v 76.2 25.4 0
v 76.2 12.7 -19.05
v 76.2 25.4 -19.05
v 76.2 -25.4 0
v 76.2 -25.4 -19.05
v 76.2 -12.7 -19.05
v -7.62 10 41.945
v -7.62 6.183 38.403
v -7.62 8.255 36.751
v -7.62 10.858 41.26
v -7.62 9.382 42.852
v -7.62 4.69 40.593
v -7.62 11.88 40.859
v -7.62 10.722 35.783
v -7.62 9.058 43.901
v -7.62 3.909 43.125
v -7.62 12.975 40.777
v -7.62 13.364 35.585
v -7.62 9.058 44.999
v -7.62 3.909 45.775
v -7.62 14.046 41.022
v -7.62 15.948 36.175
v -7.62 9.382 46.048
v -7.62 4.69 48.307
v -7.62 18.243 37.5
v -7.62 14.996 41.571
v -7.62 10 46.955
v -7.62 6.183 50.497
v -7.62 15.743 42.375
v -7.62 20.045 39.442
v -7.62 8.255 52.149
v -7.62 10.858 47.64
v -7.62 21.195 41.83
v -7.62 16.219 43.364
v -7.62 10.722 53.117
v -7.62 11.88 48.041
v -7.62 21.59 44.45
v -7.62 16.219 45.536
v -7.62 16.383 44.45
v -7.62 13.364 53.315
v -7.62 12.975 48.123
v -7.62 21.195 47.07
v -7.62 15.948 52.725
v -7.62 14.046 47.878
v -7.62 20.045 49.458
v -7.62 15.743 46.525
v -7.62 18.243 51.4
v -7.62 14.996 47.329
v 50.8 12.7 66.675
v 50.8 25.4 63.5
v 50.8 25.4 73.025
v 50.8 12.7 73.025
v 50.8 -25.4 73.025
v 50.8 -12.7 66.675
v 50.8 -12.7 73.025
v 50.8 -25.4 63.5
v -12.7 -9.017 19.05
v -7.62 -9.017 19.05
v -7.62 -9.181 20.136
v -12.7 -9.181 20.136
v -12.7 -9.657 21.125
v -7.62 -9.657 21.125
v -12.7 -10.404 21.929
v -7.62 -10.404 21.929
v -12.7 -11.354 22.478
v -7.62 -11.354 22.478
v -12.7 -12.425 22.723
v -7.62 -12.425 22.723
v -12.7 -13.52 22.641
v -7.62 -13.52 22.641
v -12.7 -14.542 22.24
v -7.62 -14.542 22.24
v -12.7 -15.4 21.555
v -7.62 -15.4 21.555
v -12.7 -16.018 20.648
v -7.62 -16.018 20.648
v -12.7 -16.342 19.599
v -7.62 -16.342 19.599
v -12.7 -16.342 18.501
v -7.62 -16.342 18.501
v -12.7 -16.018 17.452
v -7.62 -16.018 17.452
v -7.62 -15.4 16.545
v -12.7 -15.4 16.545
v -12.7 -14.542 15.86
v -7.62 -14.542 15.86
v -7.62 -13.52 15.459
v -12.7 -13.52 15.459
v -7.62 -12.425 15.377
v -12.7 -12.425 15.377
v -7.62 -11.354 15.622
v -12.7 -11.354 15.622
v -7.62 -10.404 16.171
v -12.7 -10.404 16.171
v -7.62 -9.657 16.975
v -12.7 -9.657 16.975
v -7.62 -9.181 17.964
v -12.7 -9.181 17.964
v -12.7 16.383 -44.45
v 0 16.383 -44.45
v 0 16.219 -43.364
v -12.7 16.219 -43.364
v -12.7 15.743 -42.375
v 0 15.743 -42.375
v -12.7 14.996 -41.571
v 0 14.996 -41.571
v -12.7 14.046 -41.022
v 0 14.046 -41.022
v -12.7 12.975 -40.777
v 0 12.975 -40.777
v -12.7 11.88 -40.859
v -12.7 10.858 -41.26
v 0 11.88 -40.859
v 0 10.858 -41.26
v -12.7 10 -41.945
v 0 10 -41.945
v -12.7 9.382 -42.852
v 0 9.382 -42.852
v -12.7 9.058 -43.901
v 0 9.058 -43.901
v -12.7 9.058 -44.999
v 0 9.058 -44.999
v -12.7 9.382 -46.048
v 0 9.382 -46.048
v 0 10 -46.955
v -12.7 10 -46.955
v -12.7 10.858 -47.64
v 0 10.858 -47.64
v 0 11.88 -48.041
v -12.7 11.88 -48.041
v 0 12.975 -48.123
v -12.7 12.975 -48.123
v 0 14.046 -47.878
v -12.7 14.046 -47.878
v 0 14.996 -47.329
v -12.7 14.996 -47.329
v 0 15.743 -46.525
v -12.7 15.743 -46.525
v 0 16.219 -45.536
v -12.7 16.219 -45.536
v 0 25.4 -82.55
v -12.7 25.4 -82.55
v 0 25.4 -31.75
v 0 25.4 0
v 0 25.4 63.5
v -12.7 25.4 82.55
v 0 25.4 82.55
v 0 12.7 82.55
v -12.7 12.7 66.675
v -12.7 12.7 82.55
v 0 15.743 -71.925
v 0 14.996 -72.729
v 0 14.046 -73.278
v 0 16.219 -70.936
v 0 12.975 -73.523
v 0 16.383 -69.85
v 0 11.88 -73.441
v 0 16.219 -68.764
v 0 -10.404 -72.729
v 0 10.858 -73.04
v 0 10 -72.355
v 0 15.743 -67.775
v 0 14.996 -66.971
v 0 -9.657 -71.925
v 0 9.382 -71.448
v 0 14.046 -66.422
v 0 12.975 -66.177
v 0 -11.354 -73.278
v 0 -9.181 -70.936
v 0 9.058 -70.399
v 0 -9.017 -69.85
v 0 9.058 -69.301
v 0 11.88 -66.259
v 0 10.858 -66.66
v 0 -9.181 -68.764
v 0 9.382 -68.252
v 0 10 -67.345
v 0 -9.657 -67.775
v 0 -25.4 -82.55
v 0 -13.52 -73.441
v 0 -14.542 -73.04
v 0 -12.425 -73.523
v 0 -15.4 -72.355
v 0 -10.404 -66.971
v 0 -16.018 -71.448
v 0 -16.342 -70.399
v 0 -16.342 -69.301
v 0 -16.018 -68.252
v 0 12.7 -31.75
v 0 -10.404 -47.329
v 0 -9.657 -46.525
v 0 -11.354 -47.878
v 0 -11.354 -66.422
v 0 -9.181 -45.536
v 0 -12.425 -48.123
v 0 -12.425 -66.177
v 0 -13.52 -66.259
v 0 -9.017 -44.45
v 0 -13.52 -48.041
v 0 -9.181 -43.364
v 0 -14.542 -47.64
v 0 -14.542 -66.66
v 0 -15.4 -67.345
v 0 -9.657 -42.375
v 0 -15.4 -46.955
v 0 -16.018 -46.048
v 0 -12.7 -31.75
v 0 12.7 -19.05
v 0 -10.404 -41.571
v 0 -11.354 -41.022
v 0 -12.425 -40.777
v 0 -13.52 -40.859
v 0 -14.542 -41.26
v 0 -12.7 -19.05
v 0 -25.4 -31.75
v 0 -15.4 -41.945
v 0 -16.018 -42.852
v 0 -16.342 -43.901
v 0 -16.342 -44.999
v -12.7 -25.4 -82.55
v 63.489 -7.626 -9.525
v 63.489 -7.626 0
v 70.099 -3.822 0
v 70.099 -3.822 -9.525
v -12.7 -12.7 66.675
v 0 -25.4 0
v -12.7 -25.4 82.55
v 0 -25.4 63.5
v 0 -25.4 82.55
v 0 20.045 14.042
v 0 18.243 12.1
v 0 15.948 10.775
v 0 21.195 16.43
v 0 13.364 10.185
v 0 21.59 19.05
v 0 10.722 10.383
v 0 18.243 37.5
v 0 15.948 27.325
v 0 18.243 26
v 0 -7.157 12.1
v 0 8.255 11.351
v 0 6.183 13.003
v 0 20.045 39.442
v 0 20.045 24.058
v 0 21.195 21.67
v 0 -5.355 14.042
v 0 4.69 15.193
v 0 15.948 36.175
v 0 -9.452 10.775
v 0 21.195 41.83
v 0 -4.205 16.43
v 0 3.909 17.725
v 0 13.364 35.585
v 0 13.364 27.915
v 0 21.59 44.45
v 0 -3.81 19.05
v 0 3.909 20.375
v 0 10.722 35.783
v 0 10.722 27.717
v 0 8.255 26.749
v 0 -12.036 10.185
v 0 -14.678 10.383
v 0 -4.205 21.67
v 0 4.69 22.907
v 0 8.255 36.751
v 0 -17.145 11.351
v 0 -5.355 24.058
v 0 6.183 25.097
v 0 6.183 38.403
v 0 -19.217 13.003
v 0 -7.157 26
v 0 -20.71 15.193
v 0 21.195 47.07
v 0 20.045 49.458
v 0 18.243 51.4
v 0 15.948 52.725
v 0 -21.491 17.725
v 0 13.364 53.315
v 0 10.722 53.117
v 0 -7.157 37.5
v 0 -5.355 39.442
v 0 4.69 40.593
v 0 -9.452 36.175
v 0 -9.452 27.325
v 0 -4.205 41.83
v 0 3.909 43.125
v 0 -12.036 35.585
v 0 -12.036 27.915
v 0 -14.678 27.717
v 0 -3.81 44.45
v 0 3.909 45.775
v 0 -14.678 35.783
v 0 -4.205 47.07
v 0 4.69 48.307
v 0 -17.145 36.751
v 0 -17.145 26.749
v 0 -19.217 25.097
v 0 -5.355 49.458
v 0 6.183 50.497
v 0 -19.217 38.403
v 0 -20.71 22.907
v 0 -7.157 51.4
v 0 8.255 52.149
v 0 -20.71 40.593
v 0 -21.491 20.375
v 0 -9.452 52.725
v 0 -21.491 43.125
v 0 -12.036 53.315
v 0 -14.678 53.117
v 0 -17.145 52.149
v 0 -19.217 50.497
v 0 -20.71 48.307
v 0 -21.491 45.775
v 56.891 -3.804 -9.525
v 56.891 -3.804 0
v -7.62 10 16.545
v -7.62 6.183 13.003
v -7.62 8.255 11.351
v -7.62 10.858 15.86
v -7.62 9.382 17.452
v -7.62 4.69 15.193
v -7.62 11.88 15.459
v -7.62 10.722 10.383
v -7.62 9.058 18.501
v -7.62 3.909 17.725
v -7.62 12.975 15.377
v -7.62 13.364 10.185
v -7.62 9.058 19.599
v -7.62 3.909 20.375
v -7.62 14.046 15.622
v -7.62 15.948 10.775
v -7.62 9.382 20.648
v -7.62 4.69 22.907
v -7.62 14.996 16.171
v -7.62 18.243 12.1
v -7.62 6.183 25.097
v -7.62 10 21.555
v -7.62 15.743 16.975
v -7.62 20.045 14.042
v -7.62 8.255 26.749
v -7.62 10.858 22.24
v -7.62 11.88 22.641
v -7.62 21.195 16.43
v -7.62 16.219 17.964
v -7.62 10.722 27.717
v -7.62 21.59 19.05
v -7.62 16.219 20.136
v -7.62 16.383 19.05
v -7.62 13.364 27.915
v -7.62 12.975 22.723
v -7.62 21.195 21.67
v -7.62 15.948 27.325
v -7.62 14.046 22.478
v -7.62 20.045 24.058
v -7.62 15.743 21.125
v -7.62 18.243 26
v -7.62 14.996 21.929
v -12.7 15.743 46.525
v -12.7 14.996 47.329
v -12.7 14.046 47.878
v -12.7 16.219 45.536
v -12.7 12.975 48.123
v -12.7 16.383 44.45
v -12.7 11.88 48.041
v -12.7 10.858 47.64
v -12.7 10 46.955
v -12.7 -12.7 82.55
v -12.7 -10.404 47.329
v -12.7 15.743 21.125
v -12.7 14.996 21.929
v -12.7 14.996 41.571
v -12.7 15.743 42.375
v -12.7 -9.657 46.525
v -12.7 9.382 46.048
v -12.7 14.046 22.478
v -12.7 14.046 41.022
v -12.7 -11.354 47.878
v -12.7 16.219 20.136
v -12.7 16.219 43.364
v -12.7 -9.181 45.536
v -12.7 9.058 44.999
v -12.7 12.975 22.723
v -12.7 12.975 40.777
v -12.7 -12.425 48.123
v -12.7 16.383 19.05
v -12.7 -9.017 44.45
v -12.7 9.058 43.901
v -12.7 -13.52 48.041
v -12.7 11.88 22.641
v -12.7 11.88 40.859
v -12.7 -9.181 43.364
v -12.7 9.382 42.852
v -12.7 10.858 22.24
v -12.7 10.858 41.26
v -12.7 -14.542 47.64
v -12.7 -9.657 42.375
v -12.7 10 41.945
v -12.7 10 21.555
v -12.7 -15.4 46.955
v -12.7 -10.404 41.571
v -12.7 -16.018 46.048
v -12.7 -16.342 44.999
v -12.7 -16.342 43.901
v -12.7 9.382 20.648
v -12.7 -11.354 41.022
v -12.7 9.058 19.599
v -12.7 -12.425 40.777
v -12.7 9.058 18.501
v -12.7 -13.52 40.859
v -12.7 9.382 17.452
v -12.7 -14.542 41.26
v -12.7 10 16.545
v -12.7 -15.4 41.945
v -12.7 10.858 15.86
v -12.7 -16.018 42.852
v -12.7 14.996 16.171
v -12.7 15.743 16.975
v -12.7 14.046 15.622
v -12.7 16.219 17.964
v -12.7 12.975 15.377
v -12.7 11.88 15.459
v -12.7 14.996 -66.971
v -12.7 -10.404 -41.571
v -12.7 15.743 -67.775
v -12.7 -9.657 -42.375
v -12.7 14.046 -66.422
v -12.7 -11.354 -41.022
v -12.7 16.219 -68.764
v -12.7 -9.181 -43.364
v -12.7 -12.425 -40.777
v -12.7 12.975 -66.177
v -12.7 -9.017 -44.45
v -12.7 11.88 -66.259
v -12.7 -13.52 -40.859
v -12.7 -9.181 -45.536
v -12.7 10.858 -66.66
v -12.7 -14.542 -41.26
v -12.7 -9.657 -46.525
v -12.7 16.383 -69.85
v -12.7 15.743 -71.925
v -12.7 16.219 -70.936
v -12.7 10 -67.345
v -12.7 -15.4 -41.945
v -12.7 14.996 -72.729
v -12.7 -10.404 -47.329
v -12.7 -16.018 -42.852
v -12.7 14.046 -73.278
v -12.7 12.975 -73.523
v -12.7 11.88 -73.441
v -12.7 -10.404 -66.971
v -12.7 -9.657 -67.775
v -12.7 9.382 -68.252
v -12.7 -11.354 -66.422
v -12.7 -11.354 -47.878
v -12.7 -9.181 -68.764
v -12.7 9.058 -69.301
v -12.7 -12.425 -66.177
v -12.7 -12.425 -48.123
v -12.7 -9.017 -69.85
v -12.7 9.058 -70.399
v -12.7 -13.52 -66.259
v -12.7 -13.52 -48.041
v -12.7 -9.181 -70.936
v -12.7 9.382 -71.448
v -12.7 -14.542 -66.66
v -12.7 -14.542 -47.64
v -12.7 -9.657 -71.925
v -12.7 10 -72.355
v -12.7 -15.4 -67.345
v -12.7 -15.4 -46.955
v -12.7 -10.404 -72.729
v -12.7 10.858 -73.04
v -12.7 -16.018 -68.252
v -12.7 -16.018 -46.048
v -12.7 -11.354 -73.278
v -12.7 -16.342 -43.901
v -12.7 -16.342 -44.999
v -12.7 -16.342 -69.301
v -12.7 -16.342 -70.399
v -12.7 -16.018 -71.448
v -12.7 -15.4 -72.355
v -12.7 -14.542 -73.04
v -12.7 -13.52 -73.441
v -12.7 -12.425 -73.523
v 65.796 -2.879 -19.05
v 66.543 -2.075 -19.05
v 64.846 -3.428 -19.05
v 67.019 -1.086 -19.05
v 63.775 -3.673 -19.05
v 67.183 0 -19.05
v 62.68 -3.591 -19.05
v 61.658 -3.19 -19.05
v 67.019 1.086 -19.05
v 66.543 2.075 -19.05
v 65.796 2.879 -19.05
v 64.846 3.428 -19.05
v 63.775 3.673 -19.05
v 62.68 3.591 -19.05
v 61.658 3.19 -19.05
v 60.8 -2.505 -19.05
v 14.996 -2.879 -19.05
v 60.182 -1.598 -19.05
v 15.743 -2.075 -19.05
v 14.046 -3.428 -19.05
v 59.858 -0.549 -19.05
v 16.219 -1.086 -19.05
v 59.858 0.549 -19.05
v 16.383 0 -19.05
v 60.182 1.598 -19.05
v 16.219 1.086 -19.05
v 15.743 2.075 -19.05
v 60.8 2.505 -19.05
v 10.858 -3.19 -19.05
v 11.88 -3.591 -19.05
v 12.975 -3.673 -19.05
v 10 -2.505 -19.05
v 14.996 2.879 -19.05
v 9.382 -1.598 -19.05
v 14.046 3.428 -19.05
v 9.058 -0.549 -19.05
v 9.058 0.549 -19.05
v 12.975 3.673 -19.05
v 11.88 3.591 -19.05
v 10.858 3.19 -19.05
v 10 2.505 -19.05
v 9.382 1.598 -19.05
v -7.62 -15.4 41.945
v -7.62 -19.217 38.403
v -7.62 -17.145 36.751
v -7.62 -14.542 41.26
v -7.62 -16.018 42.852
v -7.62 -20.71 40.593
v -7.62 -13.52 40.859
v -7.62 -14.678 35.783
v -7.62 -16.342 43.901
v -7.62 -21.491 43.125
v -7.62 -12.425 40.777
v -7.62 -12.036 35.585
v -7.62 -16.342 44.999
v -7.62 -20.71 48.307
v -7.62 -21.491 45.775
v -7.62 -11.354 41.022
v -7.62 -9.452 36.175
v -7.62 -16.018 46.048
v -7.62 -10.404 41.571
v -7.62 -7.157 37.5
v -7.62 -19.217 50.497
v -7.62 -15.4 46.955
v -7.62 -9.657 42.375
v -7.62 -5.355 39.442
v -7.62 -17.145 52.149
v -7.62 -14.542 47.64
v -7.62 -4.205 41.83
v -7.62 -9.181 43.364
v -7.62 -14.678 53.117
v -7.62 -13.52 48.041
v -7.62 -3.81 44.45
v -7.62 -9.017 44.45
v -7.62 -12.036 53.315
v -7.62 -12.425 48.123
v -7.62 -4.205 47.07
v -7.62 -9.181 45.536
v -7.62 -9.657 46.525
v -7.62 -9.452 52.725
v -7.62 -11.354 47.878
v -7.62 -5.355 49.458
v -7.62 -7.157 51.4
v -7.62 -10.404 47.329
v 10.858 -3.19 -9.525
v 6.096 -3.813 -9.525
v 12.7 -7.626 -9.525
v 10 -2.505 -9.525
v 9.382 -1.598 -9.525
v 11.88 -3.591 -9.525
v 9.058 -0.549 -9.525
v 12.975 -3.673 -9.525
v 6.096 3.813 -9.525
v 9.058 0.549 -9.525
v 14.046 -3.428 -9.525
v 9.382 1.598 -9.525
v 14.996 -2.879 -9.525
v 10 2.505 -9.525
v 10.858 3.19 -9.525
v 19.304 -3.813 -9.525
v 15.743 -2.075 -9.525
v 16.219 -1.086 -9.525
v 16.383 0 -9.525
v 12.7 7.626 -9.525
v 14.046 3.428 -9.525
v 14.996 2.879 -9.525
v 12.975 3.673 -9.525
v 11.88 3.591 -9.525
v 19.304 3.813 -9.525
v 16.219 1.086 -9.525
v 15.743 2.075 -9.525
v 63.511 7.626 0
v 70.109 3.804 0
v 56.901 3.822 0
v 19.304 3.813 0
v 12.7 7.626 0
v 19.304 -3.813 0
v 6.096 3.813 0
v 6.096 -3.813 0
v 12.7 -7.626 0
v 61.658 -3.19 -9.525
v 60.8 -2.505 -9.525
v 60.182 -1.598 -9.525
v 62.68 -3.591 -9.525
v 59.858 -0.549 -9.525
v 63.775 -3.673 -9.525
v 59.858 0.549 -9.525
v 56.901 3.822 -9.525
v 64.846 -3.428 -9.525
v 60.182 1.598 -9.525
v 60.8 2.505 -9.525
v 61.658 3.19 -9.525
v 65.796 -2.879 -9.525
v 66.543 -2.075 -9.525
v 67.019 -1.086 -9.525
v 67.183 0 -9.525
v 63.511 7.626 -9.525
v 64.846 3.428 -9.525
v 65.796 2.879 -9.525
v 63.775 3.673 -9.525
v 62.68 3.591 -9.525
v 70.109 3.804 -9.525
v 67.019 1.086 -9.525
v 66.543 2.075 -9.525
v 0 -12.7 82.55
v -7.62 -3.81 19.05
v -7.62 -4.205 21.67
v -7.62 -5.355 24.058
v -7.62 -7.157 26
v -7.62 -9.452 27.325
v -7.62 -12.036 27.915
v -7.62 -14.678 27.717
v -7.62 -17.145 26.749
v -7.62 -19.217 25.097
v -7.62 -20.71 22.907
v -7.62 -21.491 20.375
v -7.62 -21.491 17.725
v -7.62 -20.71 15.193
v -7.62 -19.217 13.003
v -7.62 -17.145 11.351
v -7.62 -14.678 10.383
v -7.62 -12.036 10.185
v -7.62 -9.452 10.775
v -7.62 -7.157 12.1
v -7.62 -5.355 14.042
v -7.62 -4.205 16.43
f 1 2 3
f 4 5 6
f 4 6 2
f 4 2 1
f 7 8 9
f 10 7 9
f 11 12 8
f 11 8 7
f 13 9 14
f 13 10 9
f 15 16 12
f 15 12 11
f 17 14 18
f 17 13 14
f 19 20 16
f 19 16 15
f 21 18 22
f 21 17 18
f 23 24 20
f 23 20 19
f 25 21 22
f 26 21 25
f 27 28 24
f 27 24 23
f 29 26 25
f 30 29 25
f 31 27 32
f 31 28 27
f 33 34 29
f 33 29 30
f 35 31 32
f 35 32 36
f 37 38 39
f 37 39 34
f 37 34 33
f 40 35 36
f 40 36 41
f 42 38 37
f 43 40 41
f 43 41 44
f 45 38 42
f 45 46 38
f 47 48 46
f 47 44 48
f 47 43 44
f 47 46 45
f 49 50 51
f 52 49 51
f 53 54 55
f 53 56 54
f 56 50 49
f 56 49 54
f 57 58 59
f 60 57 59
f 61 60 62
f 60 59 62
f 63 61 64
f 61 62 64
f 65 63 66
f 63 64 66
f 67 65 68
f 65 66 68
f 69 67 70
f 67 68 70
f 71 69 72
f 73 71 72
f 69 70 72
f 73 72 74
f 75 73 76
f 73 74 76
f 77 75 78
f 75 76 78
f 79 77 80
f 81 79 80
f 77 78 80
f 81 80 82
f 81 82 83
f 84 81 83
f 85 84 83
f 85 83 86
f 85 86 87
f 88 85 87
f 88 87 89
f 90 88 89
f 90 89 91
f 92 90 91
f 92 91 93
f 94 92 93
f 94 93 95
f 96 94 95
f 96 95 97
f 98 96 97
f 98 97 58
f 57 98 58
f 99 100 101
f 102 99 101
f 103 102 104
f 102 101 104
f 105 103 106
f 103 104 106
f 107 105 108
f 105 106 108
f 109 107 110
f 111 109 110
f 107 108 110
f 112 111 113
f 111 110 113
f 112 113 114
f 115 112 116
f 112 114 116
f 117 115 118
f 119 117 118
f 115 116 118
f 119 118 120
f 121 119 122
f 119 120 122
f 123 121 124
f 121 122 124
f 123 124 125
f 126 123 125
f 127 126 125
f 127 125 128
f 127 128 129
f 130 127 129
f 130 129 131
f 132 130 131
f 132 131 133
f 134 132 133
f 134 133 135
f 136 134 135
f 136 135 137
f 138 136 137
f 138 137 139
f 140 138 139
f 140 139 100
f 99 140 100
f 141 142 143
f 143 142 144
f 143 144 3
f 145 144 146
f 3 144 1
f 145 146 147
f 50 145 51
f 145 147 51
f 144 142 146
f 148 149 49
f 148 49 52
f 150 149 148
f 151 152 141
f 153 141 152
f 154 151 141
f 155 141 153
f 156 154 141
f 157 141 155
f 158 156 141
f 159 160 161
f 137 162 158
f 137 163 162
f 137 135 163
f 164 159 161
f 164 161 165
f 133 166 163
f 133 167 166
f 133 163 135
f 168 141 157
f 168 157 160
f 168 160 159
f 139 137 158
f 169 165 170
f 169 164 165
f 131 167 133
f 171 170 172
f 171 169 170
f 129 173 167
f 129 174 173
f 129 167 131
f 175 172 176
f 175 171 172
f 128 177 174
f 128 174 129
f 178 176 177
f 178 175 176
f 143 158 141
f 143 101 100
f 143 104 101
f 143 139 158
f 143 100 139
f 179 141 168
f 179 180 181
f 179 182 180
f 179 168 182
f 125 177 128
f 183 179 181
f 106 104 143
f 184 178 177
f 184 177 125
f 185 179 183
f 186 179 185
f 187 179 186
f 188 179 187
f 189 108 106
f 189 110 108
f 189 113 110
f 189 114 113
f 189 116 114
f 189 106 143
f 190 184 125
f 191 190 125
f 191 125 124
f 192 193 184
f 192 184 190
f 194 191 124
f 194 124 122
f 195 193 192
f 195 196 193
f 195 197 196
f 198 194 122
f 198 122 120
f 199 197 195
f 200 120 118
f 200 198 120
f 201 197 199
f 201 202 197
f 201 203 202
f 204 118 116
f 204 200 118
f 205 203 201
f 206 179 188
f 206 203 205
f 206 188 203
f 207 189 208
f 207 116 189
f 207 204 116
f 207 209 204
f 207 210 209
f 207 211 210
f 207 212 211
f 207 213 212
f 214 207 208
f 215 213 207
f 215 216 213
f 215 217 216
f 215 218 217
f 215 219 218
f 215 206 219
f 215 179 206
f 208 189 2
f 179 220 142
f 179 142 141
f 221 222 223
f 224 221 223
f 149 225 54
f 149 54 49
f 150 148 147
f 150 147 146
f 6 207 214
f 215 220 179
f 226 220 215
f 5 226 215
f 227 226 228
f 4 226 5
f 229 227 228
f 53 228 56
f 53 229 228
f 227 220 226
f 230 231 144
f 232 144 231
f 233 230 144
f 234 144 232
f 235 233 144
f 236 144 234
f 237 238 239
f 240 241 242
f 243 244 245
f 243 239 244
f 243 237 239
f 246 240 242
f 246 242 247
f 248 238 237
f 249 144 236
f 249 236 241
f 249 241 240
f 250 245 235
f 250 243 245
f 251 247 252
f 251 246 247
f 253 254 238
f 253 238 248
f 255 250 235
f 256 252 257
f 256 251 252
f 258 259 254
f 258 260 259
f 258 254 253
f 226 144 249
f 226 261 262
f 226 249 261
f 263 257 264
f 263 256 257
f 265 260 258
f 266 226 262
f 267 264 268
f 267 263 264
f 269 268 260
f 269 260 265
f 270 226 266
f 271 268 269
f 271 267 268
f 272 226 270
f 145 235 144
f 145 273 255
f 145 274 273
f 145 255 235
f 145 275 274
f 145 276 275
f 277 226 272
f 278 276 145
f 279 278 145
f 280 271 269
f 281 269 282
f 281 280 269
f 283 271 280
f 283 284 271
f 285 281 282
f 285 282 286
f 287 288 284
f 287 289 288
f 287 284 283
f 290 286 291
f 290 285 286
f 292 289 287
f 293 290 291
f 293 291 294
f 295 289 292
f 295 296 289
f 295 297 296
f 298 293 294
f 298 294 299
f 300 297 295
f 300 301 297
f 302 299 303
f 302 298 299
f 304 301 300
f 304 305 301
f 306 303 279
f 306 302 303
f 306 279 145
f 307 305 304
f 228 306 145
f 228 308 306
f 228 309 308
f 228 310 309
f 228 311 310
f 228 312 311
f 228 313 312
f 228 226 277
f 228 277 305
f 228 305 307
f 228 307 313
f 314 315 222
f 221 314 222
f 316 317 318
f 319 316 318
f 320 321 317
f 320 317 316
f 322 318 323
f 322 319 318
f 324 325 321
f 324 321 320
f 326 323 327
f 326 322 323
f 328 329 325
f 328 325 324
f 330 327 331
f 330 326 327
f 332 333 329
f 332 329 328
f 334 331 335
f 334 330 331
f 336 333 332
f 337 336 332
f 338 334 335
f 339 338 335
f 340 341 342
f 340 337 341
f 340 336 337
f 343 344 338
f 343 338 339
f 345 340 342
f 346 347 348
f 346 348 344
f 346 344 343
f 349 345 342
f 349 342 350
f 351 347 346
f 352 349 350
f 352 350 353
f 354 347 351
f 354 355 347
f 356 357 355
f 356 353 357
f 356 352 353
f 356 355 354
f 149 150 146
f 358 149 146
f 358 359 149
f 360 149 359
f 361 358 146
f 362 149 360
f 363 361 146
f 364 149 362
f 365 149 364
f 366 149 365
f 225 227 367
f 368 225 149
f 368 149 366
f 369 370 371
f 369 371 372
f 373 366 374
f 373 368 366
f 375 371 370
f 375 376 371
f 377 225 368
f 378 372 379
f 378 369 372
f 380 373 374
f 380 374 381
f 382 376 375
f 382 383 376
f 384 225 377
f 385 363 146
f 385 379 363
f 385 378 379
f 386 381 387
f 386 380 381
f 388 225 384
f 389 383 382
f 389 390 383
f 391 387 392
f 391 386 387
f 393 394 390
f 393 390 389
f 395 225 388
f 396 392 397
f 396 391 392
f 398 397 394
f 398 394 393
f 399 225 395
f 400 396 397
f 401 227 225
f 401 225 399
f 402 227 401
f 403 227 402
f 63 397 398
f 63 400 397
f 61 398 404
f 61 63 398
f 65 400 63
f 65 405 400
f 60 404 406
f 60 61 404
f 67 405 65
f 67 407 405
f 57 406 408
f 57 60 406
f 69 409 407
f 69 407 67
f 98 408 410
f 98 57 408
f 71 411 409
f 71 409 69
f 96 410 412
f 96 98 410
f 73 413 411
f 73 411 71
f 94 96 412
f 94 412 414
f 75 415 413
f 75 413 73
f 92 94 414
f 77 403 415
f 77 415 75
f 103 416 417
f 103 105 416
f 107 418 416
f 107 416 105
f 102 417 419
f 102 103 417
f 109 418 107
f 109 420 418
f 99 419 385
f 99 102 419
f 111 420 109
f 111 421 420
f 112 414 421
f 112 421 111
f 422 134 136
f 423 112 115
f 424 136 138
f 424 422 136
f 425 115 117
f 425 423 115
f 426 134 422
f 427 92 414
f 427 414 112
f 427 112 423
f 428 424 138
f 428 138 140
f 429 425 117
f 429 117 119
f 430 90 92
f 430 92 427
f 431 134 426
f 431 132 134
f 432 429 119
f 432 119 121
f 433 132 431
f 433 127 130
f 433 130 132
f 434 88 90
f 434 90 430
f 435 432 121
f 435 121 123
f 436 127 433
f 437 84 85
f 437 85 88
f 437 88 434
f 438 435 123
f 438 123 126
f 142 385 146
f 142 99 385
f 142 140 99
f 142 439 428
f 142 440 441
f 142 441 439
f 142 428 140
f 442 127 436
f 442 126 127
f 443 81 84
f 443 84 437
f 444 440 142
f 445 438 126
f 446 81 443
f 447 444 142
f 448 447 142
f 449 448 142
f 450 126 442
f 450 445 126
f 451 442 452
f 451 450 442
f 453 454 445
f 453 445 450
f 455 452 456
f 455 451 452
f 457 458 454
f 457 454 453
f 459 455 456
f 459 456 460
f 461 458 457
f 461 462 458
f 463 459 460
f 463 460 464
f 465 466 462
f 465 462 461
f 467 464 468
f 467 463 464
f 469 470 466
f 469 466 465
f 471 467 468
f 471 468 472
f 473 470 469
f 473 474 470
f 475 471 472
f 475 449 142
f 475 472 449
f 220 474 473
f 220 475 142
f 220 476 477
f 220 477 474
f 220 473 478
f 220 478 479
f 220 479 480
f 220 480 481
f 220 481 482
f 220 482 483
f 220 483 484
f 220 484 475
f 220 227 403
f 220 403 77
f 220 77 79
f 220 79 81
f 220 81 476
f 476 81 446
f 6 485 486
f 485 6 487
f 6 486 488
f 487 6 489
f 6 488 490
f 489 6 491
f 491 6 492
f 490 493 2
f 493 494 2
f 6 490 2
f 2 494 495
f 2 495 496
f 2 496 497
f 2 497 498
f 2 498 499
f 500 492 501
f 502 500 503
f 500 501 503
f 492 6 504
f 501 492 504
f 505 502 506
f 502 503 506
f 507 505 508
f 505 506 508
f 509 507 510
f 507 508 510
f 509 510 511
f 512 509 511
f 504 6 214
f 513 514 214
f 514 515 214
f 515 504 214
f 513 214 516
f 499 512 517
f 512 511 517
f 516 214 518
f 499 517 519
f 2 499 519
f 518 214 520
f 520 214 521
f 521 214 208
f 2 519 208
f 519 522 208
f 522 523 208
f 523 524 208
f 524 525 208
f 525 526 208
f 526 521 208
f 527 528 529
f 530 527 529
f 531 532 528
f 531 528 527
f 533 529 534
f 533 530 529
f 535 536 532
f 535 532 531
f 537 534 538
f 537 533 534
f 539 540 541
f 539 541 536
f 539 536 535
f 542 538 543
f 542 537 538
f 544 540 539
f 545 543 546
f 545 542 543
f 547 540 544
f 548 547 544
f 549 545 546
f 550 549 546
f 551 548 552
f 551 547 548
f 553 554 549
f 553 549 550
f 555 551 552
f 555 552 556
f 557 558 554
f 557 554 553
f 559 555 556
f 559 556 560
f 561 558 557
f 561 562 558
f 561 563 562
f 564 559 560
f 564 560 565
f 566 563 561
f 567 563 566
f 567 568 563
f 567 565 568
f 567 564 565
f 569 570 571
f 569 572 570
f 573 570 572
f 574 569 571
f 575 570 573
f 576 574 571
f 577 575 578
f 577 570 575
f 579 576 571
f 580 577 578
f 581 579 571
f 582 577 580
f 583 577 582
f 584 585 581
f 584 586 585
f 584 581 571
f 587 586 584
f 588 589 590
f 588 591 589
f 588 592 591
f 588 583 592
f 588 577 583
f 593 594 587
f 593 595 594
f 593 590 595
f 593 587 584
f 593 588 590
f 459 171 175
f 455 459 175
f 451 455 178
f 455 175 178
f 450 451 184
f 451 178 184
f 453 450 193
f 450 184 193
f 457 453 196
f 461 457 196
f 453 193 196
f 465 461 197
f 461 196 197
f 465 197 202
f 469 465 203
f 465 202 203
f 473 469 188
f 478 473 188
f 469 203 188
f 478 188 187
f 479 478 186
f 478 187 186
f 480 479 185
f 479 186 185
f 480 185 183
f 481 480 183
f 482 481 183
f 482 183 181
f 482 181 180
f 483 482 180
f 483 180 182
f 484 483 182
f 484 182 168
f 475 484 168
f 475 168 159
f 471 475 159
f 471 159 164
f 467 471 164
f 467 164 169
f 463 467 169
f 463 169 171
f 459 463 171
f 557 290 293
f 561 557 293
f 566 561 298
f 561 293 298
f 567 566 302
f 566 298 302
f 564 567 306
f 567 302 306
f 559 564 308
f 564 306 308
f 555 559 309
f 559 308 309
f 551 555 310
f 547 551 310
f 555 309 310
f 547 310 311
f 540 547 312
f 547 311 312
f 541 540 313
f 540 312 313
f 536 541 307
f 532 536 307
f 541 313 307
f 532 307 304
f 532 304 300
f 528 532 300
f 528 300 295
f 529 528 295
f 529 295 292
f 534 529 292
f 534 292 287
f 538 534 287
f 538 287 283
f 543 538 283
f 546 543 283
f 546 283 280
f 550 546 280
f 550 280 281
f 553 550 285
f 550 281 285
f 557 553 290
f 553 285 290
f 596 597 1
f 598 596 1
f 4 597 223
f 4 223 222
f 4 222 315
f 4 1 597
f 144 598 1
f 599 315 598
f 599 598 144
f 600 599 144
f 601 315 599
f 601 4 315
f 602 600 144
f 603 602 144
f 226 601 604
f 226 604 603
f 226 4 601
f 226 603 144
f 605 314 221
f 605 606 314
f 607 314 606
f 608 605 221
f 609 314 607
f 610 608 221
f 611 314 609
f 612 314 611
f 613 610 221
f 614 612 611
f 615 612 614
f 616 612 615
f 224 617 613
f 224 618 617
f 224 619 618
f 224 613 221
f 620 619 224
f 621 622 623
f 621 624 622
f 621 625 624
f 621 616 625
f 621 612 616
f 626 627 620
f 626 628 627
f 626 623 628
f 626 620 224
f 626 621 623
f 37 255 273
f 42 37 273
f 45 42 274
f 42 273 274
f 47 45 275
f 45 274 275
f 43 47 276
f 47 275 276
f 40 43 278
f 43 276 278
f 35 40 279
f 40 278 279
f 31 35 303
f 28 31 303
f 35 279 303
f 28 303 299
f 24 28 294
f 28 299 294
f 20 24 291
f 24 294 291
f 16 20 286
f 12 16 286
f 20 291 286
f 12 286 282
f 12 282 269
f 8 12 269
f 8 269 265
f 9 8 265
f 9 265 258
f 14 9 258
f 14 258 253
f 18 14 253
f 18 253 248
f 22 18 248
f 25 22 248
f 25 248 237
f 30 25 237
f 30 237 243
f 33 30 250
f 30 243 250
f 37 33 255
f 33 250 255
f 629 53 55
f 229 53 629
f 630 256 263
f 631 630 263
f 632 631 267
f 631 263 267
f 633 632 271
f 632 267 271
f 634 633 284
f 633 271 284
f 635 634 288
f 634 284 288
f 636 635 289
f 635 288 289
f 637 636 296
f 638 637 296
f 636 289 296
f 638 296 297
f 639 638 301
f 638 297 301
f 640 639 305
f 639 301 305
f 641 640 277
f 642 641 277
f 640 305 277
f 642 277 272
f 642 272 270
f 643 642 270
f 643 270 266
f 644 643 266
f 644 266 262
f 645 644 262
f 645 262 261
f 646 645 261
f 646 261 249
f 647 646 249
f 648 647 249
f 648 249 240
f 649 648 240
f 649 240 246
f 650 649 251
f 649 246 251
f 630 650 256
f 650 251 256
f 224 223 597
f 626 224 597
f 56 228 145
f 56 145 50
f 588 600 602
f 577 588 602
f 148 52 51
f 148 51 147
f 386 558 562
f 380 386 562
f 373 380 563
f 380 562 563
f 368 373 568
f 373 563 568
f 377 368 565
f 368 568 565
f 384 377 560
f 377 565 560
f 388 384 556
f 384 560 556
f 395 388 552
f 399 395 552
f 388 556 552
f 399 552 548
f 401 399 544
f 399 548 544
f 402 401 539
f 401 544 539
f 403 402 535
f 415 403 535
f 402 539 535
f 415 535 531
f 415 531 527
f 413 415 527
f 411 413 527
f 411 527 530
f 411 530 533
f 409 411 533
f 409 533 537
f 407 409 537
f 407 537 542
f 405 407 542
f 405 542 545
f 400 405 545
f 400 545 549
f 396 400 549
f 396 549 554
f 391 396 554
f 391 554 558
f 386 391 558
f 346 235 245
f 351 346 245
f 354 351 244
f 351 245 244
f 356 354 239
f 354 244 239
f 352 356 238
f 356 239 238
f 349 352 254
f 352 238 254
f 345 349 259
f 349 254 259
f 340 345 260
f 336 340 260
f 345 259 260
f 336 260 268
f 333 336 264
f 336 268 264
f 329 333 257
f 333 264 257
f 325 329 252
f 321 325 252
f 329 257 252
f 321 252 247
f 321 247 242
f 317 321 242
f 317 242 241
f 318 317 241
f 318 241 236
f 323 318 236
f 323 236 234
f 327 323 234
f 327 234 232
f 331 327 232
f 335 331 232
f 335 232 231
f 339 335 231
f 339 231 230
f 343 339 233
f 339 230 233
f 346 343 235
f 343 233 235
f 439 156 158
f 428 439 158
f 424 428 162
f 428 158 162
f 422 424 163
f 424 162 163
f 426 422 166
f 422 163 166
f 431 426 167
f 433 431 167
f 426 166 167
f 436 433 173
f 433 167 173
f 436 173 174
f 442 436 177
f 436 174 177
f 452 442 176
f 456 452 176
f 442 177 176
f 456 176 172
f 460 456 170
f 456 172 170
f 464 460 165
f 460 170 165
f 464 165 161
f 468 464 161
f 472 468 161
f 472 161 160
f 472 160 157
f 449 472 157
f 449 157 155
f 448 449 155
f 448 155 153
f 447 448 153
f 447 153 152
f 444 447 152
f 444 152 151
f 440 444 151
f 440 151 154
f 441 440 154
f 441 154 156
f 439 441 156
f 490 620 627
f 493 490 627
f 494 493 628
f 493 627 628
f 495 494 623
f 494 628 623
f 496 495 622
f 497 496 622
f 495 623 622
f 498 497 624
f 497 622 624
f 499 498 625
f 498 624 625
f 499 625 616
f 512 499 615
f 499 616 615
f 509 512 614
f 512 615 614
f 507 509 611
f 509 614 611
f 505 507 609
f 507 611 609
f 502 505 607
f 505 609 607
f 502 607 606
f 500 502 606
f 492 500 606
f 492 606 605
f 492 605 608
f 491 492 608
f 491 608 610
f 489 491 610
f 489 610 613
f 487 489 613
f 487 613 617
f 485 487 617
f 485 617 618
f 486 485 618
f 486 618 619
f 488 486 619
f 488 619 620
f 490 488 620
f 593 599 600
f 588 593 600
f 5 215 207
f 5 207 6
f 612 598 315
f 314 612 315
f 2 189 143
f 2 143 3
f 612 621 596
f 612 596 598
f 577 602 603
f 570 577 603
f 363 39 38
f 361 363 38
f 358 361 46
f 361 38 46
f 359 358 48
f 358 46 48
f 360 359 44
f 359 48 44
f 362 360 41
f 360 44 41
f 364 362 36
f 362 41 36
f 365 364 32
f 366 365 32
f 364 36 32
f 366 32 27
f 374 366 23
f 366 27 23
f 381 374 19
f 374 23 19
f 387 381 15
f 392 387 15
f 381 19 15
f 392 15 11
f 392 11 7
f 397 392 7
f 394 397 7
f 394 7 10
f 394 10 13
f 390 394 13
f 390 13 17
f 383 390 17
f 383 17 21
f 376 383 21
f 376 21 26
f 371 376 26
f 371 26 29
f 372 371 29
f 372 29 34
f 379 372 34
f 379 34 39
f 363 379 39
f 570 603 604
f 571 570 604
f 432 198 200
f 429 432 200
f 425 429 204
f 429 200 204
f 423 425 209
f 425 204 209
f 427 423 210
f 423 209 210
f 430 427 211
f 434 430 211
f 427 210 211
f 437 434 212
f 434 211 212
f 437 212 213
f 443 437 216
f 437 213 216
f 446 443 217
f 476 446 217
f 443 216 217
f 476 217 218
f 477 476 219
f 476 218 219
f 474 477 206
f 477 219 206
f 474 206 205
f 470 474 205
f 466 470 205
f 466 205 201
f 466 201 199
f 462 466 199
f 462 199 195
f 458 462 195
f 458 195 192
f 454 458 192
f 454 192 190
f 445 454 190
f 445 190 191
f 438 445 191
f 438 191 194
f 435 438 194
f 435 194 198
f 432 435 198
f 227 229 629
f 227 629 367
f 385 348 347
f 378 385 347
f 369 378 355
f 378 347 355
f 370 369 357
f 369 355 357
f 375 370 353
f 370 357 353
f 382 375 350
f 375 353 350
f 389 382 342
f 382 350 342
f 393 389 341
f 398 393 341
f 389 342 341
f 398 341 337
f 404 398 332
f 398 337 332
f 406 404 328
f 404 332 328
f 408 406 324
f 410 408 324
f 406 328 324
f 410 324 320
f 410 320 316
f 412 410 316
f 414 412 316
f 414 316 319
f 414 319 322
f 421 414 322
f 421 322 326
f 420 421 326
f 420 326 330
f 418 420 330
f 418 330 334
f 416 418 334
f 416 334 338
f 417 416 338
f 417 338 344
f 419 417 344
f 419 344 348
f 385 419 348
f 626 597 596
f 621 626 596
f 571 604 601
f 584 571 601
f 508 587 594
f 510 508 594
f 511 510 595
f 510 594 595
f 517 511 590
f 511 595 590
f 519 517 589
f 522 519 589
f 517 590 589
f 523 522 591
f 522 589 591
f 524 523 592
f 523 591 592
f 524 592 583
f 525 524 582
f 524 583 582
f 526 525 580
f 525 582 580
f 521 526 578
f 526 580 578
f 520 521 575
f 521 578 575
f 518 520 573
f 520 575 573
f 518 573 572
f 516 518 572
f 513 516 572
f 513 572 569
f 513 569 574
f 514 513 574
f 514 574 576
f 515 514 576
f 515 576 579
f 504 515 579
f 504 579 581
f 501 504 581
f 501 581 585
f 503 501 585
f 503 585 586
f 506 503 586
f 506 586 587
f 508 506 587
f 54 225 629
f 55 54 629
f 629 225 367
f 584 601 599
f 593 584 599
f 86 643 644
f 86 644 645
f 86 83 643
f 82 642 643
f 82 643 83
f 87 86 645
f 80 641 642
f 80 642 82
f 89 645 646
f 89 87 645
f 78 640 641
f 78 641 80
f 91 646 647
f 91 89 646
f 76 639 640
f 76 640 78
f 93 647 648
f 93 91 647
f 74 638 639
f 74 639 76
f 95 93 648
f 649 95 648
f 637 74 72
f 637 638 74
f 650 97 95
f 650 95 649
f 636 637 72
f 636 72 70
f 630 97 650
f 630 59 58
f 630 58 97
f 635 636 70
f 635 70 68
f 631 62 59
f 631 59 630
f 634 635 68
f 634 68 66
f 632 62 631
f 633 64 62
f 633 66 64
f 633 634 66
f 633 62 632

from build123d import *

# Parameters (mm, degrees)
F1_DEPTH      = 25.4
F2_W          = 25.4
F2_H          = 15.875
F3_DEPTH      = 12.701
F3_DEPTH_BACK = 76.201
F5_DEPTH      = 9.525
F6_R          = 3.683
F7_DEPTH      = 82.551
F8_W          = 25.4
F8_H          = 12.7
F9_DEPTH      = 76.201
F10_R         = 3.683
F11_DEPTH     = 12.701
F12_R         = 8.89
F13_DEPTH     = 7.62


with BuildPart() as f1:
    # F0 (on Front) → F1 (new body, symmetric)
    with BuildSketch(Plane.XZ):
        Polygon((76.2, 0), (0, 0), (0, 63.5), (50.8, 63.5), (50.8, 73.025), (0, 82.55), (-12.7, 82.55), (-12.7, -82.55), (0, -82.55), (0, -31.75), (76.2, -19.05), align=None)
    extrude(amount=F1_DEPTH, both=True)

    # F2 (on Right) → F3 (cut, two sides)
    with BuildSketch(Plane.YZ) as f3_sk:
        with Locations((0, 74.6125)):
            Rectangle(F2_W, F2_H)
    extrude(amount=-F3_DEPTH, mode=Mode.SUBTRACT)
    extrude(f3_sk.sketch, amount=F3_DEPTH_BACK, mode=Mode.SUBTRACT)

    # F4 (on Top) → F5 (cut)
    with BuildSketch(Plane.XY):
        Polygon((19.304, -3.8128211777), (19.304, 3.8128211777), (12.7, 7.6256423555), (6.096, 3.8128211777), (6.096, -3.8128211777), (12.7, -7.6256423555), align=None)
        Polygon((70.1092849155, 3.8036527495), (63.5105825496, 7.6256350124), (56.901297634, 3.821982263), (56.8907150845, -3.8036527495), (63.4894174504, -7.6256350124), (70.098702366, -3.821982263), align=None)
    extrude(amount=-F5_DEPTH, mode=Mode.SUBTRACT)

    # F6 (on Top) → F7 (cut, through all)
    with BuildSketch(Plane.XY):
        with Locations((12.7, 0)):
            Circle(F6_R)
        with Locations((63.5, 0)):
            Circle(F6_R)
    extrude(amount=-F7_DEPTH, mode=Mode.SUBTRACT)

    # F8 (on Right) → F9 (cut, through all)
    with BuildSketch(Plane.YZ):
        with Locations((0, -25.4)):
            Rectangle(F8_W, F8_H)
    extrude(amount=F9_DEPTH, mode=Mode.SUBTRACT)

    # F10 (on Right) → F11 (cut, through all)
    with BuildSketch(Plane.YZ):
        with Locations((-12.7, -44.45)):
            Circle(F10_R)
        with Locations((12.7, -44.45)):
            Circle(F10_R)
        with Locations((-12.7, -69.85)):
            Circle(F10_R)
        with Locations((12.7, -69.85)):
            Circle(F10_R)
        with Locations((-12.7, 19.05)):
            Circle(F10_R)
        with Locations((12.7, 19.05)):
            Circle(F10_R)
        with Locations((-12.7, 44.45)):
            Circle(F10_R)
        with Locations((12.7, 44.45)):
            Circle(F10_R)
    extrude(amount=-F11_DEPTH, mode=Mode.SUBTRACT)

    # F12 (on Right) → F13 (cut)
    with BuildSketch(Plane.YZ):
        with Locations((-12.7, 44.45)):
            Circle(F12_R)
        with Locations((12.7, 44.45)):
            Circle(F12_R)
        with Locations((-12.7, 19.05)):
            Circle(F12_R)
        with Locations((12.7, 19.05)):
            Circle(F12_R)
    extrude(amount=-F13_DEPTH, mode=Mode.SUBTRACT)


solid = f1.part
